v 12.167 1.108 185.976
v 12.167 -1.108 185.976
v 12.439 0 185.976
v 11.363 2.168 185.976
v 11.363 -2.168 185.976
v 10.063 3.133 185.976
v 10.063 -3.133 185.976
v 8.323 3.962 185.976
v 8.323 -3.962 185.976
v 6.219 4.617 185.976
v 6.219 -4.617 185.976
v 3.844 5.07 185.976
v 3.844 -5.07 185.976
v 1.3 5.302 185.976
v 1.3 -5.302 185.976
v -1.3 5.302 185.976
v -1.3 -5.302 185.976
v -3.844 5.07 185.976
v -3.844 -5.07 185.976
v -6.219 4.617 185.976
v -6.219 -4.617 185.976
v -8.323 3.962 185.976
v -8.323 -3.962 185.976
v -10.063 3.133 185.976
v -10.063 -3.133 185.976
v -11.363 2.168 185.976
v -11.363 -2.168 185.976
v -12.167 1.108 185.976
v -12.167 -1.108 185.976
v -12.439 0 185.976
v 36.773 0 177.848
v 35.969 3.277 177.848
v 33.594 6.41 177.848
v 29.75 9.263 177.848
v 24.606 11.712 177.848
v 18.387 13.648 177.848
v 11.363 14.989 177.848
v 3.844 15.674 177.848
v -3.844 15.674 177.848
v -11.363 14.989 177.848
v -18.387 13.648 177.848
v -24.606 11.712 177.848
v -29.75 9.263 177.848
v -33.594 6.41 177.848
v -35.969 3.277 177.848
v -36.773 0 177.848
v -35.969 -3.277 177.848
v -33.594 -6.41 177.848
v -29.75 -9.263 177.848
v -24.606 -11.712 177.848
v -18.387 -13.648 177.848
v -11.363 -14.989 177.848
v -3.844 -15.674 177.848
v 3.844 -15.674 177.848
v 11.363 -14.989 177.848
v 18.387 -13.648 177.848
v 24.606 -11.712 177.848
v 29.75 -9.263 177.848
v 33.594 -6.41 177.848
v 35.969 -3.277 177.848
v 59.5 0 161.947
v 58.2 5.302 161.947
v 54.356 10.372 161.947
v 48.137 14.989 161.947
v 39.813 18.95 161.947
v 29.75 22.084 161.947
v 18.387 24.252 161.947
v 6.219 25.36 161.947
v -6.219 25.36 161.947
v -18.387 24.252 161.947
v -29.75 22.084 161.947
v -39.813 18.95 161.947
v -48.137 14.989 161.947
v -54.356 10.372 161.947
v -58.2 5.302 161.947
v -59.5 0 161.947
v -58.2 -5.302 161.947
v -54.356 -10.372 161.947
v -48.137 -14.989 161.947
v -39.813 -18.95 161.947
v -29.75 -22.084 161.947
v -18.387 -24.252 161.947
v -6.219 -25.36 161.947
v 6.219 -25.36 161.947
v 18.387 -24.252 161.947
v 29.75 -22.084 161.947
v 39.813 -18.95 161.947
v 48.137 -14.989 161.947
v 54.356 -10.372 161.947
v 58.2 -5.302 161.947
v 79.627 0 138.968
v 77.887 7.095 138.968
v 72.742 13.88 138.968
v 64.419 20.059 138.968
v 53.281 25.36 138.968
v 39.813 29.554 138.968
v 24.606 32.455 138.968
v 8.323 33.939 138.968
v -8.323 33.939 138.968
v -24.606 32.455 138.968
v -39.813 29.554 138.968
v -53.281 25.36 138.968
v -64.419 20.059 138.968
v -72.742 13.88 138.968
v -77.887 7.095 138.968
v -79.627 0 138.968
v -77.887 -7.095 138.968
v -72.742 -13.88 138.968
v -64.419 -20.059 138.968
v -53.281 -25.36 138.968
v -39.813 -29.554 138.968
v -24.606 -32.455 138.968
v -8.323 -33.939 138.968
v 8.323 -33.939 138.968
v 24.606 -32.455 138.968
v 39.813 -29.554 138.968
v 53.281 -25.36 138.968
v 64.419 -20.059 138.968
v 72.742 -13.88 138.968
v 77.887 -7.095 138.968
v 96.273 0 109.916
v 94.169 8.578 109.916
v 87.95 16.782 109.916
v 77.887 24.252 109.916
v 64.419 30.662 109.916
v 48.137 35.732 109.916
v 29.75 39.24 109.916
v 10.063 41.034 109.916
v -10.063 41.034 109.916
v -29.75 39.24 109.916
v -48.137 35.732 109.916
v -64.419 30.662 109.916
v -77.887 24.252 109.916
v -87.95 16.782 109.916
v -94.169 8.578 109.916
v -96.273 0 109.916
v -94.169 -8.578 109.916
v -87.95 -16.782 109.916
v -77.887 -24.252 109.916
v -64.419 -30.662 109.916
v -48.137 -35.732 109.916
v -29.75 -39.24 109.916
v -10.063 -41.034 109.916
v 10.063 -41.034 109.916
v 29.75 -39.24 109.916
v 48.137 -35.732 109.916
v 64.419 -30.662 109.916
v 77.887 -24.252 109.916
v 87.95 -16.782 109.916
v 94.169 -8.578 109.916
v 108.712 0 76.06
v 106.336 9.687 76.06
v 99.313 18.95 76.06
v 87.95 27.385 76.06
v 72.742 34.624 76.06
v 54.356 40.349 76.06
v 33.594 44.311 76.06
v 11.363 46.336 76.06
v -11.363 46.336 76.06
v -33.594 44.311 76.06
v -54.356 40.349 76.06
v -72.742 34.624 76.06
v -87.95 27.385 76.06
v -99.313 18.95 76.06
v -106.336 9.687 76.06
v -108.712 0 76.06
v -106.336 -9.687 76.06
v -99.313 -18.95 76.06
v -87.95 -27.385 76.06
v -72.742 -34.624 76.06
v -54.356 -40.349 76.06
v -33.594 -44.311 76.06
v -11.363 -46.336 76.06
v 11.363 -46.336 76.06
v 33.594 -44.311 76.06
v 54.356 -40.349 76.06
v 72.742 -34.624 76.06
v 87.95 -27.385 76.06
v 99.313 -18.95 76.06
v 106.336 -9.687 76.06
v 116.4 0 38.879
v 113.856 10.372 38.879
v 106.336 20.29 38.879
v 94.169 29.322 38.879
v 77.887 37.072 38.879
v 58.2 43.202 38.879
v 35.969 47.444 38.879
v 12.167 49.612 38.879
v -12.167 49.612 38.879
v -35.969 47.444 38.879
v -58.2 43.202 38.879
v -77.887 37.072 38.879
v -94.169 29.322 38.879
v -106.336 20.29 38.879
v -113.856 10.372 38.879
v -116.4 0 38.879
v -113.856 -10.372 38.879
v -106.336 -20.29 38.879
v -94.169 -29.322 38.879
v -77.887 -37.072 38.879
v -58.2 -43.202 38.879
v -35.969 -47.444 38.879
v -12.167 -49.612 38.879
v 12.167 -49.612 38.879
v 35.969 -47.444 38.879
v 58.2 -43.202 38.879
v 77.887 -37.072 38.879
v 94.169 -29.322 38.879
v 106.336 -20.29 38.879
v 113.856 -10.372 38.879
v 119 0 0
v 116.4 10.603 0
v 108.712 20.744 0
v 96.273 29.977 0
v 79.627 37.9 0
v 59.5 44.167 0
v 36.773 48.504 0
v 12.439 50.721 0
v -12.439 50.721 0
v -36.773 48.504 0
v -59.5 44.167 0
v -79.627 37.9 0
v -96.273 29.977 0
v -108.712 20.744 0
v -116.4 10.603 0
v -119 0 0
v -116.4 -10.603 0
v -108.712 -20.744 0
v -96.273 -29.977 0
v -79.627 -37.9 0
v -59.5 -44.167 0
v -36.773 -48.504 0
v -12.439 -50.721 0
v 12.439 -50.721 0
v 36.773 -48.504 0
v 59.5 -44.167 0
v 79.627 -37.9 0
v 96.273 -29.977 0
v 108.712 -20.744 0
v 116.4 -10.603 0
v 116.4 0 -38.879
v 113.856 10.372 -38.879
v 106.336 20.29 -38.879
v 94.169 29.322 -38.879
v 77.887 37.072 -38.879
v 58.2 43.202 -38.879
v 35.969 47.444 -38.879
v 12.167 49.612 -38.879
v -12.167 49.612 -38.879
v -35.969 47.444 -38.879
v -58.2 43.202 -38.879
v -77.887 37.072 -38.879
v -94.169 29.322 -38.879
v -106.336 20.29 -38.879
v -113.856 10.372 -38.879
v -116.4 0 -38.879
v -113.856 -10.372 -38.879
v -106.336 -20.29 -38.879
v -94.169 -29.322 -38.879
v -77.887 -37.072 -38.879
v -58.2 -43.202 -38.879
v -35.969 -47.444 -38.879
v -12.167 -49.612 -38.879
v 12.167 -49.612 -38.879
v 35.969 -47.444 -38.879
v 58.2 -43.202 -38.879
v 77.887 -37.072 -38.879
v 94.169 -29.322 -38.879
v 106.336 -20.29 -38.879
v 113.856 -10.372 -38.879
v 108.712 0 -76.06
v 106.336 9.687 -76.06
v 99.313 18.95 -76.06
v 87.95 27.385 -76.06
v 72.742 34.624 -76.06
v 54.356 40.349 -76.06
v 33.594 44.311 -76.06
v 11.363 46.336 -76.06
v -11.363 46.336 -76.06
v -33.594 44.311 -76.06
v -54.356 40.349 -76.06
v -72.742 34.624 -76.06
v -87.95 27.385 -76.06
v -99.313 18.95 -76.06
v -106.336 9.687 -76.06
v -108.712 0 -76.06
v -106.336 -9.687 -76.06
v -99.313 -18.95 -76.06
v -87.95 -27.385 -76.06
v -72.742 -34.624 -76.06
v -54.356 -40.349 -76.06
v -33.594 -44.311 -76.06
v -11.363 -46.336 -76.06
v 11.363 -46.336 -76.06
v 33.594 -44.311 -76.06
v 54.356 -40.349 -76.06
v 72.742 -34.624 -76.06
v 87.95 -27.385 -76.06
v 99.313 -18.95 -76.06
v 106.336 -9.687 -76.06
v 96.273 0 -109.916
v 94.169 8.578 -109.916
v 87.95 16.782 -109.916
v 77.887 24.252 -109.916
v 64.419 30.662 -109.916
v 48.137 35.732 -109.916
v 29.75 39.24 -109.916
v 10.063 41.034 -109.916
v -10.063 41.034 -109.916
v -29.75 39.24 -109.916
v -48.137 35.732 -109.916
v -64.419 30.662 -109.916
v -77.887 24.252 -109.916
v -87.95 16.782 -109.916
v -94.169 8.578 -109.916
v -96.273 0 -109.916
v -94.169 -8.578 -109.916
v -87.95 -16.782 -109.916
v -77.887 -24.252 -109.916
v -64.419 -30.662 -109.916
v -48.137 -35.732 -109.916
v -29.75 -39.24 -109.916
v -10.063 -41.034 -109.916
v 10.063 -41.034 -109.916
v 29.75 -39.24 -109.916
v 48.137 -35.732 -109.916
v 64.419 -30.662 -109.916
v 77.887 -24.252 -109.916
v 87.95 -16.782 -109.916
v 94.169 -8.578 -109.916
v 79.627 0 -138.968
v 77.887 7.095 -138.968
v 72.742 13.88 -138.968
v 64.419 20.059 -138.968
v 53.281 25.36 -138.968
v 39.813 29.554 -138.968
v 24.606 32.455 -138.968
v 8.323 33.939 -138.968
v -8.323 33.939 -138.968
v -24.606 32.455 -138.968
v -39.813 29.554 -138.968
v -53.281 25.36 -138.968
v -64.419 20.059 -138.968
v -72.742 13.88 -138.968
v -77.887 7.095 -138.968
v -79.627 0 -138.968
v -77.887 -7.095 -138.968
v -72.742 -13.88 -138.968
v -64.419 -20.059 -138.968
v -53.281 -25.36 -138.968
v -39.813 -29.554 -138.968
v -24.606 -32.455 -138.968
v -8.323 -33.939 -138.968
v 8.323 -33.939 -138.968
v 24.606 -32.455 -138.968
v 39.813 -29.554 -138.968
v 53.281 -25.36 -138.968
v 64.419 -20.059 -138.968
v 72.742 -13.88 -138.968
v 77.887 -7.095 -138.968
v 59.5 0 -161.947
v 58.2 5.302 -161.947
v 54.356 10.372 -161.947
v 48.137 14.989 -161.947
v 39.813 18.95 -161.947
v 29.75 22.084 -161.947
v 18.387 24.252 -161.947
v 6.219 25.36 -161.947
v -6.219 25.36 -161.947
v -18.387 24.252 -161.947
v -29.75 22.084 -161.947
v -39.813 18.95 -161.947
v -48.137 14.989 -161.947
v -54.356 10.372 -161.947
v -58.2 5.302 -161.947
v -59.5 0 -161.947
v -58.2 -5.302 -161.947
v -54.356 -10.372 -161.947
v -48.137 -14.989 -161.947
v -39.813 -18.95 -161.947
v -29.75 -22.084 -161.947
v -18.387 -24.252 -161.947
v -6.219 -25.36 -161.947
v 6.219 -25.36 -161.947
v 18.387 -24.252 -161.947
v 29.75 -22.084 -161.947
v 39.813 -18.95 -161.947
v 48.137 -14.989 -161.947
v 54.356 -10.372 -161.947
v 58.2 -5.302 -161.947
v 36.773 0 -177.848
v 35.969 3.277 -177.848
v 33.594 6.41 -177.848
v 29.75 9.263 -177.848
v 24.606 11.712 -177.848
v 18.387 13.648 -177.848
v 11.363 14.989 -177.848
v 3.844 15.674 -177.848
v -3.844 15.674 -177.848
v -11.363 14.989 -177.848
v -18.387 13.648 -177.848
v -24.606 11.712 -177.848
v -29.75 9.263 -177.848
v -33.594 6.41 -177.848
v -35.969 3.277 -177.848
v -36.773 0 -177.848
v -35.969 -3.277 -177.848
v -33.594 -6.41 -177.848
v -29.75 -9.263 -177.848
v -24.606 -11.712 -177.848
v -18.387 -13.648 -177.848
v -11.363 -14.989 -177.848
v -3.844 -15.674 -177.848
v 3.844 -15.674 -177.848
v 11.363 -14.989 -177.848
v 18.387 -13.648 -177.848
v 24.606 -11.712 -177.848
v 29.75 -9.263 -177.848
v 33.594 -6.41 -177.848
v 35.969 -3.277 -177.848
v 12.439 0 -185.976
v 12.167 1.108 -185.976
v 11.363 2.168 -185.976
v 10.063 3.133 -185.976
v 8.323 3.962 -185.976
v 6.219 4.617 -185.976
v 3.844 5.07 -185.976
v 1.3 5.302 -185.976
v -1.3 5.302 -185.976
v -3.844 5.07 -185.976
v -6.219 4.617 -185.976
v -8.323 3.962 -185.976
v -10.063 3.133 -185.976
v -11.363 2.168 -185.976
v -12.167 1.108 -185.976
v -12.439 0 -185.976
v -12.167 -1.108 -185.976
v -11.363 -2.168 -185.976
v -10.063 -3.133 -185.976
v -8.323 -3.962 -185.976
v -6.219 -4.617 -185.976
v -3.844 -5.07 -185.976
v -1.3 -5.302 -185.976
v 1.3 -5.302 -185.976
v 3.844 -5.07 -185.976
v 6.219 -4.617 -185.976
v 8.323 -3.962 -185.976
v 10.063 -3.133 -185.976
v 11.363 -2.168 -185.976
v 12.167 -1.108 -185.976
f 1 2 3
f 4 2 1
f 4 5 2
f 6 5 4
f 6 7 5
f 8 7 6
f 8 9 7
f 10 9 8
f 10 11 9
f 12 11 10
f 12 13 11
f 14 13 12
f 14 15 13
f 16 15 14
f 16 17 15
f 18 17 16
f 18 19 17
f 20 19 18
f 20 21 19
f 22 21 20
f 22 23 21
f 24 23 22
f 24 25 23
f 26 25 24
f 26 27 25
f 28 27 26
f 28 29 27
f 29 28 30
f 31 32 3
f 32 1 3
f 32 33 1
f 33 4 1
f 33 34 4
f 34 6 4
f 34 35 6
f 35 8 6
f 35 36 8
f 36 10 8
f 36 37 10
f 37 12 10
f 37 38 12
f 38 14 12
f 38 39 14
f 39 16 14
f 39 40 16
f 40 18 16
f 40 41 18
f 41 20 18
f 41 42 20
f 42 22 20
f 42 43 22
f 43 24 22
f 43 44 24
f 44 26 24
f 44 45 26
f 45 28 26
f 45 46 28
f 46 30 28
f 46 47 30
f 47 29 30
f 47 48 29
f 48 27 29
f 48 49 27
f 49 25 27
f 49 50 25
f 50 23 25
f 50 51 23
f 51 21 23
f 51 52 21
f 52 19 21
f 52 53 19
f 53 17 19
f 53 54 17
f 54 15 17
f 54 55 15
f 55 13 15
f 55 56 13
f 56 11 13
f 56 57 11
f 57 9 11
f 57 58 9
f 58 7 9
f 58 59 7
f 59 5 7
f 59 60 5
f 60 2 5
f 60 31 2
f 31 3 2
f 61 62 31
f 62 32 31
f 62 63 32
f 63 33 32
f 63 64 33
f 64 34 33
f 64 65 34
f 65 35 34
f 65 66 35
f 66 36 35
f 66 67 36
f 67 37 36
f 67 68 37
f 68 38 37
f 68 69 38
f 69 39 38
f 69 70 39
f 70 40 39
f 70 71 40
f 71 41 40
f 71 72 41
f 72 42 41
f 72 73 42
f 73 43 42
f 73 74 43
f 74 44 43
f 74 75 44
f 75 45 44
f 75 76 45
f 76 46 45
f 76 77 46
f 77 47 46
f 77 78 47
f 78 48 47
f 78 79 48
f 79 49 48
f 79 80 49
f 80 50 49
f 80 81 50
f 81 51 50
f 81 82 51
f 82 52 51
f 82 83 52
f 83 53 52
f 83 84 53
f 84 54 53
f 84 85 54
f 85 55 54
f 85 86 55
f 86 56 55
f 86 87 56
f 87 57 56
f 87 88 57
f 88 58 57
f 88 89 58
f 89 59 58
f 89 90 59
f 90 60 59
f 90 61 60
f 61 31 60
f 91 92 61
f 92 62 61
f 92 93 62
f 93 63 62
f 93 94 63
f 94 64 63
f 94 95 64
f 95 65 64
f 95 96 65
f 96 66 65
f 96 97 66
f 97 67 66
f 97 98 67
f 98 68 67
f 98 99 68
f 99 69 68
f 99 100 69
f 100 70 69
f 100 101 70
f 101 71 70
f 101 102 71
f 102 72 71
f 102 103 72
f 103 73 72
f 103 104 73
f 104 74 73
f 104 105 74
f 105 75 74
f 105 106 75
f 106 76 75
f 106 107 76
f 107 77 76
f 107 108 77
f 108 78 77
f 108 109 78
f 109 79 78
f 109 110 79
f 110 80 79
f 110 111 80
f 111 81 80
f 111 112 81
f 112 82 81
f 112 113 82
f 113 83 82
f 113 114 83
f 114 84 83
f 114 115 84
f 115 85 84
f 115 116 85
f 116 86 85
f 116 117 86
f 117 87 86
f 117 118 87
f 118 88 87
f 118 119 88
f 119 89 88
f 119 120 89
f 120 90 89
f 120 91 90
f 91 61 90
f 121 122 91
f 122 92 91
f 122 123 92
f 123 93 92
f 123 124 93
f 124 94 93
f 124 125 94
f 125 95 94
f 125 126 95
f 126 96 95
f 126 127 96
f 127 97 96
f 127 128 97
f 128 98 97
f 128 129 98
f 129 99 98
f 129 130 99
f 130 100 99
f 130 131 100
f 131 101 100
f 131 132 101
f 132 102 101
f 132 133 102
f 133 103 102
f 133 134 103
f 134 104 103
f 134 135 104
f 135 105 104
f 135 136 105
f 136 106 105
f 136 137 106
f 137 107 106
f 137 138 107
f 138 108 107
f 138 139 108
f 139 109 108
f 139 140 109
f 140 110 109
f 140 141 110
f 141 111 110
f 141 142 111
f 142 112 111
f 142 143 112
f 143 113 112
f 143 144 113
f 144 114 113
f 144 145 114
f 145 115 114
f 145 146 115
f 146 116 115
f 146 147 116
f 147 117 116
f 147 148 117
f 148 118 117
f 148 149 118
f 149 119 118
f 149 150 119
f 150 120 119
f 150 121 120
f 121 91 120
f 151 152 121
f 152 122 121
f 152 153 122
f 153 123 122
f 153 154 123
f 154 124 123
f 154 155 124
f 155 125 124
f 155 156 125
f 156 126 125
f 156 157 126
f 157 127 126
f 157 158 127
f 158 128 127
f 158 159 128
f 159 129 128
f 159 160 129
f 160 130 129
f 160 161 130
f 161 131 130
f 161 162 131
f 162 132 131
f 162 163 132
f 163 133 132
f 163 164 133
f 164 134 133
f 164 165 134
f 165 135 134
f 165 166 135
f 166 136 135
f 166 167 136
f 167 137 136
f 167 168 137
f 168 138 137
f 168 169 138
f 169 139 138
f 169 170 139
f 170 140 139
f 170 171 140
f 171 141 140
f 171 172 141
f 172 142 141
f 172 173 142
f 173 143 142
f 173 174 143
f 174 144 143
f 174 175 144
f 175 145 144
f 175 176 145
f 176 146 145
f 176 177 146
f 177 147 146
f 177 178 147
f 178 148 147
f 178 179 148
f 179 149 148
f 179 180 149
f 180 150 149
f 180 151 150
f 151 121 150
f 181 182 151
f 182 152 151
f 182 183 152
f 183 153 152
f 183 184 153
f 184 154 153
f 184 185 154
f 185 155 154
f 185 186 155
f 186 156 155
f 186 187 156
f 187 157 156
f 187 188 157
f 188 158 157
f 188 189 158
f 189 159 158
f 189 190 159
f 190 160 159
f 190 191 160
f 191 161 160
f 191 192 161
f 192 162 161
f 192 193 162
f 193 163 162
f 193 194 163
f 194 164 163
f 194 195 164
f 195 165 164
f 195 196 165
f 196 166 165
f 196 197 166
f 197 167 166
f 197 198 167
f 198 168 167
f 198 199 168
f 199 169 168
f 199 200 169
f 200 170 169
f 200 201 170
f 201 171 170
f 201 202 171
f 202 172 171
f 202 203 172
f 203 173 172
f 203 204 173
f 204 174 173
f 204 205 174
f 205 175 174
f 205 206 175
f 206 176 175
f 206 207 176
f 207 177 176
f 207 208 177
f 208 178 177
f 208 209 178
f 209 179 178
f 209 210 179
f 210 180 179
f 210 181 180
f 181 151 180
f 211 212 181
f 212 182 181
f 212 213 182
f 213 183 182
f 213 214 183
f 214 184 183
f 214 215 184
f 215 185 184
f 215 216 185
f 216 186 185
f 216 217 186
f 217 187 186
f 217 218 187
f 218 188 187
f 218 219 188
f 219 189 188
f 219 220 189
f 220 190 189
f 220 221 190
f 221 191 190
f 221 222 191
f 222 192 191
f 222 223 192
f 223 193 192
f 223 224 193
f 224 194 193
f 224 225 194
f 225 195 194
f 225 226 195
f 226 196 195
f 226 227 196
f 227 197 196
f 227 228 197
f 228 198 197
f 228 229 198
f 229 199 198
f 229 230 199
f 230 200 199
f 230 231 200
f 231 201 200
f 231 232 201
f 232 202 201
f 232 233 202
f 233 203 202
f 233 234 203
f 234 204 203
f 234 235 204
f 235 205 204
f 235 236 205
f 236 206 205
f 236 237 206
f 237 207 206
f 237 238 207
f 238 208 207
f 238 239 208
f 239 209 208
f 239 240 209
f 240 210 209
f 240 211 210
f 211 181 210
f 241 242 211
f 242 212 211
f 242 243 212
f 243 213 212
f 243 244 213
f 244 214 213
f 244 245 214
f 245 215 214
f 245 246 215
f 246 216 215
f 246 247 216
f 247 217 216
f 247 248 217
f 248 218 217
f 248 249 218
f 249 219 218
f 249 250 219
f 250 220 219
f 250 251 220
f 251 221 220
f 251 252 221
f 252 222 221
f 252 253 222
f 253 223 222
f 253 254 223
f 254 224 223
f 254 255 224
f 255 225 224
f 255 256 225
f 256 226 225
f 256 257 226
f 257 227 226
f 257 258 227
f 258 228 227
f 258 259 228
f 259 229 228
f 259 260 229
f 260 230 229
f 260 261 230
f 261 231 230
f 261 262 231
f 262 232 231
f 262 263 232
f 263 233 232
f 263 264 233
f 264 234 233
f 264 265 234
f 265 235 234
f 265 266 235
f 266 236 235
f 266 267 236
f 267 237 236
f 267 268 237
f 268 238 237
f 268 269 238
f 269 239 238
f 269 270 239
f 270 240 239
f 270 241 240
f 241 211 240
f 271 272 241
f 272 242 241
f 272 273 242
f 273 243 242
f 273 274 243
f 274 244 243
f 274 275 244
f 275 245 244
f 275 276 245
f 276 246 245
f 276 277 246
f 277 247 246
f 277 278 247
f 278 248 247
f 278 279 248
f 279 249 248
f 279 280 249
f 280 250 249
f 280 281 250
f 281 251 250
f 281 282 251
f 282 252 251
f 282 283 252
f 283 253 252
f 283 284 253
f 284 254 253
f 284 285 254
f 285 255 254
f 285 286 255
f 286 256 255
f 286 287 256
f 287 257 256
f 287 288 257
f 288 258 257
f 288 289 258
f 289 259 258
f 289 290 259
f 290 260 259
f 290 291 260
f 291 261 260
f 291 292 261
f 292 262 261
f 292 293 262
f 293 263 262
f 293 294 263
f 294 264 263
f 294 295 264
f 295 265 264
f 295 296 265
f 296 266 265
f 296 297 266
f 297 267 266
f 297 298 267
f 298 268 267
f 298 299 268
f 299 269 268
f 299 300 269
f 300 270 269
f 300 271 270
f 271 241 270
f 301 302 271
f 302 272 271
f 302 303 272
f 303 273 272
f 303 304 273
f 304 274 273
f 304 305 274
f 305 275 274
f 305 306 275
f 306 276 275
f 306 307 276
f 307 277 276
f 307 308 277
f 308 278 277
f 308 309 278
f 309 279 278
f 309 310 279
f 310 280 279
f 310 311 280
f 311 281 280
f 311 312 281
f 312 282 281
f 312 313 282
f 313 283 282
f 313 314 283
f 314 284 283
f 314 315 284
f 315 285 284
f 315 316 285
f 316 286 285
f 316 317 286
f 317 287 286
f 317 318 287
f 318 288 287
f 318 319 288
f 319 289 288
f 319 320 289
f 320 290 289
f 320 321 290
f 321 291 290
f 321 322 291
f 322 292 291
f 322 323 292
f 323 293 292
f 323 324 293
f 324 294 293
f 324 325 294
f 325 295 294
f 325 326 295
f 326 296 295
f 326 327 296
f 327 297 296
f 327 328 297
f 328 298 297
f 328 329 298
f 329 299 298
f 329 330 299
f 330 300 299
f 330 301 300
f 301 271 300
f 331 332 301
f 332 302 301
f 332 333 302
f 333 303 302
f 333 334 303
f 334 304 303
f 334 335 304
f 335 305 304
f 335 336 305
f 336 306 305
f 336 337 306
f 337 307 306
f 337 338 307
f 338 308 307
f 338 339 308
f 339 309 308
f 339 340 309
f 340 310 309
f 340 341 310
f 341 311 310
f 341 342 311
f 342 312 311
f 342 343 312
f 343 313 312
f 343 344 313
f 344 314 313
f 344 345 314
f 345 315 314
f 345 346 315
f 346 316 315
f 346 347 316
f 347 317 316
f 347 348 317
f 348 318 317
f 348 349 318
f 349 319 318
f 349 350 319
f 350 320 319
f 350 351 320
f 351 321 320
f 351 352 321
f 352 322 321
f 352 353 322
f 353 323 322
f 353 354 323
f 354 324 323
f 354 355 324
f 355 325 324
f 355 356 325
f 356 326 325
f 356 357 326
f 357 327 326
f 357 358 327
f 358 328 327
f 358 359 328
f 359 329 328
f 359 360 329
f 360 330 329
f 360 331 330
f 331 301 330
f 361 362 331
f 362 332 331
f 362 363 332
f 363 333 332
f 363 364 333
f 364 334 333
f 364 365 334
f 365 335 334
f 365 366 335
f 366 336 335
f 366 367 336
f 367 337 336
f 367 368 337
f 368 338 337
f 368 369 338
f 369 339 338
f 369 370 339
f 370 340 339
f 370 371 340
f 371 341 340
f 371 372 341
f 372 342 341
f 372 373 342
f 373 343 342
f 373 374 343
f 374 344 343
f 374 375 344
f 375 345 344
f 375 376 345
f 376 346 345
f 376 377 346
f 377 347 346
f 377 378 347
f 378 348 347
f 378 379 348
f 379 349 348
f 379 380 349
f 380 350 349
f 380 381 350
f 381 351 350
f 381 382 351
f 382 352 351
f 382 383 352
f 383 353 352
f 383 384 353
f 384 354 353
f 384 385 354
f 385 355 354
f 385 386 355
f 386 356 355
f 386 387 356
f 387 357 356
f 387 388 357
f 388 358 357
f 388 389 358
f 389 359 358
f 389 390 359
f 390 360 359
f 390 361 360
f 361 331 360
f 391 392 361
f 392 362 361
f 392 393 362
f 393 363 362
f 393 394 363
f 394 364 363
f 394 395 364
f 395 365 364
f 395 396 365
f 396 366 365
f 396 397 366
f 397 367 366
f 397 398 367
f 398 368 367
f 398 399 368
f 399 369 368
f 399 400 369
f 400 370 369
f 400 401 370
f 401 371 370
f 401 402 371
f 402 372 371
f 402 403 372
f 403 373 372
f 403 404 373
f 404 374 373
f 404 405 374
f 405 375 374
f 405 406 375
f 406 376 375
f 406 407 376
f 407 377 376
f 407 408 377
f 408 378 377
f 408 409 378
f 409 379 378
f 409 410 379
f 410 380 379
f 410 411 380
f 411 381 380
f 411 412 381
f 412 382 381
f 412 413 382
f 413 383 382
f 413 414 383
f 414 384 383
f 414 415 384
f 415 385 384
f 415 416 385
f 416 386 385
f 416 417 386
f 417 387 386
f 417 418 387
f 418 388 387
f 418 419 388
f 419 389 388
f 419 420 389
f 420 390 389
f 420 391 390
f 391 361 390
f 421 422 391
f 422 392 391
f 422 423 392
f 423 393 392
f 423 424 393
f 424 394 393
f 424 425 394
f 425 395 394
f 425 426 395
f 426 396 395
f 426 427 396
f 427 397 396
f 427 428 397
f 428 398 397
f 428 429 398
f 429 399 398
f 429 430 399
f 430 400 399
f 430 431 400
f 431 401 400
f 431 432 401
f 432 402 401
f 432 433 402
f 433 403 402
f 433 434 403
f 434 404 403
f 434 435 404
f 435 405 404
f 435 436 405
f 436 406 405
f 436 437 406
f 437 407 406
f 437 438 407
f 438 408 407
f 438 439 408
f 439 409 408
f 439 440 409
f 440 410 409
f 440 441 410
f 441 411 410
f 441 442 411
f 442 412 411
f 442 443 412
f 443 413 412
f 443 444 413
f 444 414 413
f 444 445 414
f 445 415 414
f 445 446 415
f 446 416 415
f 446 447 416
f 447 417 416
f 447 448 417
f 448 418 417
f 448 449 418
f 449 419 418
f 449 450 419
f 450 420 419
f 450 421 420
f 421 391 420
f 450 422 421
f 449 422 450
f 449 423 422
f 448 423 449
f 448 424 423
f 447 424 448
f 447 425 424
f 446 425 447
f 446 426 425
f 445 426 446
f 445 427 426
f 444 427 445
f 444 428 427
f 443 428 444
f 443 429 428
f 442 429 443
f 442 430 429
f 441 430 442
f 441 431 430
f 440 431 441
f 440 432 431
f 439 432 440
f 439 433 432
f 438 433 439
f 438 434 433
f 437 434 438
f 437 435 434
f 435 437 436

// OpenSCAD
// Generated by SolidPython 1.0.1 on 2020-07-29 00:46:47


scale(v = [7, 3, 11]) {
	sphere(r = 17);
}
/***********************************************
*********      SolidPython code:      **********
************************************************
 
# import packages: SolidPython
from solid import *
from solid.utils import *
from itertools import chain, combinations, permutations


class Resize:

    def __init__(self, scad_file):
        self.scad_file = scad_file
        #self.scad_file = import_scad(scad_file)
        # cone/cylinder param:
        self.r1 = 0
        self.r2 = 0
        self.h = 0
        # rectangular prism param:
        self.w = 0
        self.l = 0
        # ellipse param:
        self.r = 0

    # import OpenScad code (file name corresponds to shape)


    # classify shape + parameters
    def assign(self, param1, param2, param3):
        if self.scad_file == 'cone.scad':
            self.r1 = param1
            self.r2 = param2
            self.h = param3
        elif self.scad_file == 'cylinder.scad':
            self.r1 = param1
            self.r2 = param2
            self.h = param3
        elif self.scad_file == 'rectangularPrism.scad':
            self.h = param1
            self.l = param2
            self.w = param3
        else:
            self.r = param1
            self.h = param2

    # resize parameters
    def iterate(self):
        x = range(3, 20, 2)
        i = 1
        if self.scad_file == 'cone.scad':
            tempList = list(permutations(x, 2))
            for temp in tempList:
                param1 = temp[0]
                param2 = temp[1]
                filepath = 'produced_scad_files/' + 'cone' + str(param1) + '_' + str(param2) + '_' + '.scad'
                scad_render_to_file(cylinder(h=param1, r1=param2, r2=0), filepath)

        elif self.scad_file == 'cylinder.scad':
            tempList = list(permutations(x, 3))
            for temp in tempList:
                param1 = temp[0]
                param2 = temp[1]
                filepath = 'produced_scad_files/' + 'cylinder' + str(param1) + '_' + str(param2) + '_' + '.scad'
                scad_render_to_file(cylinder(h=param1, r1=param2, r2=param2), filepath)

        elif self.scad_file == 'rectangularPrism.scad':
            tempList = list(permutations(x, 3))
            for temp in tempList:
                param1 = temp[0]
                param2 = temp[1]
                param3 = temp[2]
                filepath = 'produced_scad_files/' + 'rectangularPrism' + str(param1) + '_' + str(param2) + '_' + str(
                    param3) + '.scad'
                scad_render_to_file(cube(size=(param1, param2, param3)), filepath)

        elif self.scad_file == 'ellipse.scad':
            tempList = list(permutations(x, 4))
            for temp in tempList:
                param1 = temp[0]
                param2 = temp[1]
                param3 = temp[2]
                param4 = temp[3]
                filepath = 'produced_scad_files/' + 'ellipse' + str(param1) + '_' + str(param2) + '_' + str(param3) + '_' + str(param4) + '.scad'
                scad_render_to_file(scale([param1, param2, param3])(sphere(r=param4)), filepath)

    def render_to_scadfile(self):
        scad_render_to_file(scad, 'example.scad') 
 
************************************************/
